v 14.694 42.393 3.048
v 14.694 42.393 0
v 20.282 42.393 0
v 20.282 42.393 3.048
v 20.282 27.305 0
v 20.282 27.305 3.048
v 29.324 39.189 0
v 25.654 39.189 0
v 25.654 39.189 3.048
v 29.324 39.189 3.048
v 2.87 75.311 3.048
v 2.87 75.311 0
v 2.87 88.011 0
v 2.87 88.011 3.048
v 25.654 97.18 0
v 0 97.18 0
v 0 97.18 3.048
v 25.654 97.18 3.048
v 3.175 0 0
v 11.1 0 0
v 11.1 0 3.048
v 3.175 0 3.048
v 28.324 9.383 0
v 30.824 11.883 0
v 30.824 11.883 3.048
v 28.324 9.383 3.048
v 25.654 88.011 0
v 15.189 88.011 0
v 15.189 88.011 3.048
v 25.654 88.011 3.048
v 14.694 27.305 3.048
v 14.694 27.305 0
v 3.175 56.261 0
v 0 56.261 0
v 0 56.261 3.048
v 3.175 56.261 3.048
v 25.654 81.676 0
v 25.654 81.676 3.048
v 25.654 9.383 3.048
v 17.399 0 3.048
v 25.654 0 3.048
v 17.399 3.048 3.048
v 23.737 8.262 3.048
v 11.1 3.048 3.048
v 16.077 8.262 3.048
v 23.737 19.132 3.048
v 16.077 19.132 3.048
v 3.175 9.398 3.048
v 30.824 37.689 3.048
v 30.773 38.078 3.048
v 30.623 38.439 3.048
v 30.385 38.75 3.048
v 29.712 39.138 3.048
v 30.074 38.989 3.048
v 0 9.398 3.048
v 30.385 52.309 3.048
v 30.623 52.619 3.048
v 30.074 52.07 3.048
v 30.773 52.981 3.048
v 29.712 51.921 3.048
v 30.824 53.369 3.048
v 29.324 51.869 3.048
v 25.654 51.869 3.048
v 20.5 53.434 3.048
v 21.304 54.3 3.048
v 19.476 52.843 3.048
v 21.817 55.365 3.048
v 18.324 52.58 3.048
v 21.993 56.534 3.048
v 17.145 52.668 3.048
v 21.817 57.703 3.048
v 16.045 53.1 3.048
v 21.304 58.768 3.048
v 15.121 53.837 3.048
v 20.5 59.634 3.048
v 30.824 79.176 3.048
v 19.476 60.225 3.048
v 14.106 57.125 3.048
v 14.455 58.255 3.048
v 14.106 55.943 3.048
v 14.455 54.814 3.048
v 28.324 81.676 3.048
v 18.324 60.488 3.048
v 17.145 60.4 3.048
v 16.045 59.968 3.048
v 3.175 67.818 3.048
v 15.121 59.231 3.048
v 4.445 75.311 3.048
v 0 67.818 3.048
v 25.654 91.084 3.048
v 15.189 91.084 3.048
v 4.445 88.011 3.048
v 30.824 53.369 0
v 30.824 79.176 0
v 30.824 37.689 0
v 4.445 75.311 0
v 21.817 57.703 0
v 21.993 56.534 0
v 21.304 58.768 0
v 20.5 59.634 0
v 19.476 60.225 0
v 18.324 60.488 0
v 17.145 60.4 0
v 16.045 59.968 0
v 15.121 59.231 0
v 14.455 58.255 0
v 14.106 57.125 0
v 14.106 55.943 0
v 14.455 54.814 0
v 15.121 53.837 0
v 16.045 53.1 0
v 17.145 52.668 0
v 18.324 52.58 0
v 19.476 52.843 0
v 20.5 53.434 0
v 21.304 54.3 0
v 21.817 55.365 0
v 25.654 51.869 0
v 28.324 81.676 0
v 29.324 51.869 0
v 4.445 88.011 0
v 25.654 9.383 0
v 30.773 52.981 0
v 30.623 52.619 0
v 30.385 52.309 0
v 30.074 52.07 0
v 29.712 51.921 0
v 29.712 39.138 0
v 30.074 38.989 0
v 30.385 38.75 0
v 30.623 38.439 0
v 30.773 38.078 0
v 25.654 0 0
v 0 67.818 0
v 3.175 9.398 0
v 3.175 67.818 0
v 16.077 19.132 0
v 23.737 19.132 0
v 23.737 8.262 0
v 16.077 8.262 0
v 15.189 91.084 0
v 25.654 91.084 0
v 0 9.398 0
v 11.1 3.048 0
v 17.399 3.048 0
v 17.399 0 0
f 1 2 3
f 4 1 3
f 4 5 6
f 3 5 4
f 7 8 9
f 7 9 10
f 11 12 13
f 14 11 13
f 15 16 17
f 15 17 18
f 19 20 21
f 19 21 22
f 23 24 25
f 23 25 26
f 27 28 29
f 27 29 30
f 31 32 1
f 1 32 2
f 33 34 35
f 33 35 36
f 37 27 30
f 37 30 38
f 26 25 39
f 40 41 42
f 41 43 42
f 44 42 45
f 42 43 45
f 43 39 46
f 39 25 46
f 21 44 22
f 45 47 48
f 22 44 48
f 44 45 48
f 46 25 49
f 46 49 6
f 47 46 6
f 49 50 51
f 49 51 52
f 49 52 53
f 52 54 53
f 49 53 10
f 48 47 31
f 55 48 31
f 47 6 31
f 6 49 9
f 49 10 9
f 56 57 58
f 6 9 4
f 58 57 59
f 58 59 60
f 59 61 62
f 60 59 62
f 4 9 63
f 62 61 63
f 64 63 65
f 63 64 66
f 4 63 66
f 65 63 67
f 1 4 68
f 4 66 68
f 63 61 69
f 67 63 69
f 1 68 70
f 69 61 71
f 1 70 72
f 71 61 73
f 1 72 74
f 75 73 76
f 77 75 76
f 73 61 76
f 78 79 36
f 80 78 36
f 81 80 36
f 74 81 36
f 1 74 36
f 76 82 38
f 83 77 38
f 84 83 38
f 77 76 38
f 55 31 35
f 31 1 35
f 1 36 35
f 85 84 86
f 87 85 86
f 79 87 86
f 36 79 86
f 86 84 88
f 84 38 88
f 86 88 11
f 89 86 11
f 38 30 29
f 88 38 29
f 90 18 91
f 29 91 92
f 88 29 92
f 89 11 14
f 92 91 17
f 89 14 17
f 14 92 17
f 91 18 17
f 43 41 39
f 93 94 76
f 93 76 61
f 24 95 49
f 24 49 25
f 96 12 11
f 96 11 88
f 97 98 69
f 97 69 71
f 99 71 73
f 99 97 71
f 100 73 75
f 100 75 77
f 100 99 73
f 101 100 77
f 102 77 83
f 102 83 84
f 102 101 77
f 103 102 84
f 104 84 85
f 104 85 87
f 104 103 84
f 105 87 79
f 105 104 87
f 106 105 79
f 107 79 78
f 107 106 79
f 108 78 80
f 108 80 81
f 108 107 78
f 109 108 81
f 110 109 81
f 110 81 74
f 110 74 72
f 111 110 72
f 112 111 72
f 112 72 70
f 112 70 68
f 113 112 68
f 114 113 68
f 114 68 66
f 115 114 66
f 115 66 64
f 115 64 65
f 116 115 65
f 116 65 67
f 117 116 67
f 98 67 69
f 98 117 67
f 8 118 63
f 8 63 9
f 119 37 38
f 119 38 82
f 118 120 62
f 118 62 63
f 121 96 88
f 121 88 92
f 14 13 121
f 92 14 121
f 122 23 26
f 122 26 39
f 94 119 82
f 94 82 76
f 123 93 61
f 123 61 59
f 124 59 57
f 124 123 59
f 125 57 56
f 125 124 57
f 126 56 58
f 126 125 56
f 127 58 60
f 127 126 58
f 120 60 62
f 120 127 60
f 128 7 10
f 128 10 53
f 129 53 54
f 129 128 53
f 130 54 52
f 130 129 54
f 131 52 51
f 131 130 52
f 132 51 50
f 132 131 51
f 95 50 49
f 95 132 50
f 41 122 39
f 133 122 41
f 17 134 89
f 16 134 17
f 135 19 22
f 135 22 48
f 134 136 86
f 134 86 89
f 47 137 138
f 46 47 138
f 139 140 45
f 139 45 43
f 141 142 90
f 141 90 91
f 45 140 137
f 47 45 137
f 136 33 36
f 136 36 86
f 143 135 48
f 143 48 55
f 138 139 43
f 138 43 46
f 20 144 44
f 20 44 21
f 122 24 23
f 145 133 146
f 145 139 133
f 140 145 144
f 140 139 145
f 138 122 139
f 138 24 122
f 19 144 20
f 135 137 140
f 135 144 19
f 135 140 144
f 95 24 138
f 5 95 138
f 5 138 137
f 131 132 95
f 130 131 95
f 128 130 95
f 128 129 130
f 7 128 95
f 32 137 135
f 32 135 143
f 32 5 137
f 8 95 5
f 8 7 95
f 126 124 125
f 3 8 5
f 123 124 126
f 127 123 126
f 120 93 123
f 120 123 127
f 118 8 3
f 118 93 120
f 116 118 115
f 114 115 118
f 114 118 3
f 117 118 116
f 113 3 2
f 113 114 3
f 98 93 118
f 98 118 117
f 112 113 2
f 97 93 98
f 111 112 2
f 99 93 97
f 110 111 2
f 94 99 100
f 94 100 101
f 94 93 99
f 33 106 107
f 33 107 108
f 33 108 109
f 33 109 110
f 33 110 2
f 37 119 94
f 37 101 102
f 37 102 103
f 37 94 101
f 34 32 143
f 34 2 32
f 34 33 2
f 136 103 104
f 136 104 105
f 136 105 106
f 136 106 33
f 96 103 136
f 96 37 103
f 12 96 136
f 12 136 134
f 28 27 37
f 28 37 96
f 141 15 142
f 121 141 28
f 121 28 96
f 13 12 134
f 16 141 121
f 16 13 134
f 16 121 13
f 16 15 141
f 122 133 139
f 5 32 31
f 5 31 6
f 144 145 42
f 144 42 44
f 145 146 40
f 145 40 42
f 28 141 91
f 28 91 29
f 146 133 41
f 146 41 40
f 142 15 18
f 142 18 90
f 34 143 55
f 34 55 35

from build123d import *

# Parameters (mm, degrees)
MODEL_R             = 3.96545
MODEL_W             = 1.574799418
MODEL_H             = 12.699998915
MODEL_W_2           = 5.587999709
MODEL_H_2           = 15.087600797
MODEL_W_3           = 7.66
MODEL_H_3           = 10.87
BOSS_EXTRUDE1_DEPTH = 3.048


with BuildPart() as part:
    # Model → Boss-Extrude1 (new body)
    with BuildSketch(Plane.XY):
        with BuildLine():
            Line((25.653999648, 91.084402986), (15.189199708, 91.084402986))
            Line((15.189199708, 91.084402986), (15.189199708, 88.011001237))
            Line((15.189199708, 88.011001237), (25.653999648, 88.011001237))
            Line((25.653999648, 88.011001237), (25.653999648, 81.675999849))
            Line((25.653999648, 81.675999849), (28.323999648, 81.675999849))
            Line((28.323999648, 81.675999849), (30.823999648, 79.175999849))
            Line((30.823999648, 79.175999849), (30.823999648, 53.369499849))
            ThreePointArc((30.823999648, 53.369499849), (30.38465982, 52.308839677), (29.323999648, 51.869499849))
            Line((29.323999648, 51.869499849), (25.653999648, 51.869499849))
            Line((25.653999648, 51.869499849), (25.653999648, 39.189499849))
            Line((25.653999648, 39.189499849), (29.323999648, 39.189499849))
            ThreePointArc((29.323999648, 39.189499849), (30.38465982, 38.750160021), (30.823999648, 37.689499849))
            Line((30.823999648, 37.689499849), (30.823999648, 11.882999849))
            Line((30.823999648, 11.882999849), (28.323999648, 9.382999849))
            Line((28.323999648, 9.382999849), (25.653999648, 9.382999849))
            Line((25.653999648, 9.382999849), (25.653999648, 0))
            Line((25.653999648, 0), (17.399000004, 0))
            Line((17.399000004, 0), (17.399000004, 3.047999926))
            Line((17.399000004, 3.047999926), (11.099800467, 3.047999926))
            Line((11.099800467, 3.047999926), (11.099800467, 0))
            Line((11.099800467, 0), (3.174999729, 0))
            Line((3.174999729, 0), (3.174999729, 9.397999849))
            Line((3.174999729, 9.397999849), (0, 9.397999849))
            Line((0, 9.397999849), (0, 56.261000223))
            Line((0, 56.261000223), (3.174999729, 56.261000223))
            Line((3.174999729, 56.261000223), (3.174999729, 67.817998119))
            Line((3.174999729, 67.817998119), (0, 67.817998119))
            Line((0, 67.817998119), (0, 97.180393524))
            Line((0, 97.180393524), (25.653999648, 97.180393524))
            Line((25.653999648, 97.180393524), (25.653999648, 91.084402986))
        make_face()
        with Locations((18.027649688, 56.534049926)):
            Circle(MODEL_R, mode=Mode.SUBTRACT)
        with Locations((3.657599911, 81.661001779)):
            Rectangle(MODEL_W, MODEL_H, mode=Mode.SUBTRACT)
        with Locations((17.487899866, 34.848800861)):
            Rectangle(MODEL_W_2, MODEL_H_2, mode=Mode.SUBTRACT)
        with Locations((19.907249836, 13.696949929)):
            Rectangle(MODEL_W_3, MODEL_H_3, mode=Mode.SUBTRACT)
    extrude(amount=BOSS_EXTRUDE1_DEPTH)


solid = part.part
